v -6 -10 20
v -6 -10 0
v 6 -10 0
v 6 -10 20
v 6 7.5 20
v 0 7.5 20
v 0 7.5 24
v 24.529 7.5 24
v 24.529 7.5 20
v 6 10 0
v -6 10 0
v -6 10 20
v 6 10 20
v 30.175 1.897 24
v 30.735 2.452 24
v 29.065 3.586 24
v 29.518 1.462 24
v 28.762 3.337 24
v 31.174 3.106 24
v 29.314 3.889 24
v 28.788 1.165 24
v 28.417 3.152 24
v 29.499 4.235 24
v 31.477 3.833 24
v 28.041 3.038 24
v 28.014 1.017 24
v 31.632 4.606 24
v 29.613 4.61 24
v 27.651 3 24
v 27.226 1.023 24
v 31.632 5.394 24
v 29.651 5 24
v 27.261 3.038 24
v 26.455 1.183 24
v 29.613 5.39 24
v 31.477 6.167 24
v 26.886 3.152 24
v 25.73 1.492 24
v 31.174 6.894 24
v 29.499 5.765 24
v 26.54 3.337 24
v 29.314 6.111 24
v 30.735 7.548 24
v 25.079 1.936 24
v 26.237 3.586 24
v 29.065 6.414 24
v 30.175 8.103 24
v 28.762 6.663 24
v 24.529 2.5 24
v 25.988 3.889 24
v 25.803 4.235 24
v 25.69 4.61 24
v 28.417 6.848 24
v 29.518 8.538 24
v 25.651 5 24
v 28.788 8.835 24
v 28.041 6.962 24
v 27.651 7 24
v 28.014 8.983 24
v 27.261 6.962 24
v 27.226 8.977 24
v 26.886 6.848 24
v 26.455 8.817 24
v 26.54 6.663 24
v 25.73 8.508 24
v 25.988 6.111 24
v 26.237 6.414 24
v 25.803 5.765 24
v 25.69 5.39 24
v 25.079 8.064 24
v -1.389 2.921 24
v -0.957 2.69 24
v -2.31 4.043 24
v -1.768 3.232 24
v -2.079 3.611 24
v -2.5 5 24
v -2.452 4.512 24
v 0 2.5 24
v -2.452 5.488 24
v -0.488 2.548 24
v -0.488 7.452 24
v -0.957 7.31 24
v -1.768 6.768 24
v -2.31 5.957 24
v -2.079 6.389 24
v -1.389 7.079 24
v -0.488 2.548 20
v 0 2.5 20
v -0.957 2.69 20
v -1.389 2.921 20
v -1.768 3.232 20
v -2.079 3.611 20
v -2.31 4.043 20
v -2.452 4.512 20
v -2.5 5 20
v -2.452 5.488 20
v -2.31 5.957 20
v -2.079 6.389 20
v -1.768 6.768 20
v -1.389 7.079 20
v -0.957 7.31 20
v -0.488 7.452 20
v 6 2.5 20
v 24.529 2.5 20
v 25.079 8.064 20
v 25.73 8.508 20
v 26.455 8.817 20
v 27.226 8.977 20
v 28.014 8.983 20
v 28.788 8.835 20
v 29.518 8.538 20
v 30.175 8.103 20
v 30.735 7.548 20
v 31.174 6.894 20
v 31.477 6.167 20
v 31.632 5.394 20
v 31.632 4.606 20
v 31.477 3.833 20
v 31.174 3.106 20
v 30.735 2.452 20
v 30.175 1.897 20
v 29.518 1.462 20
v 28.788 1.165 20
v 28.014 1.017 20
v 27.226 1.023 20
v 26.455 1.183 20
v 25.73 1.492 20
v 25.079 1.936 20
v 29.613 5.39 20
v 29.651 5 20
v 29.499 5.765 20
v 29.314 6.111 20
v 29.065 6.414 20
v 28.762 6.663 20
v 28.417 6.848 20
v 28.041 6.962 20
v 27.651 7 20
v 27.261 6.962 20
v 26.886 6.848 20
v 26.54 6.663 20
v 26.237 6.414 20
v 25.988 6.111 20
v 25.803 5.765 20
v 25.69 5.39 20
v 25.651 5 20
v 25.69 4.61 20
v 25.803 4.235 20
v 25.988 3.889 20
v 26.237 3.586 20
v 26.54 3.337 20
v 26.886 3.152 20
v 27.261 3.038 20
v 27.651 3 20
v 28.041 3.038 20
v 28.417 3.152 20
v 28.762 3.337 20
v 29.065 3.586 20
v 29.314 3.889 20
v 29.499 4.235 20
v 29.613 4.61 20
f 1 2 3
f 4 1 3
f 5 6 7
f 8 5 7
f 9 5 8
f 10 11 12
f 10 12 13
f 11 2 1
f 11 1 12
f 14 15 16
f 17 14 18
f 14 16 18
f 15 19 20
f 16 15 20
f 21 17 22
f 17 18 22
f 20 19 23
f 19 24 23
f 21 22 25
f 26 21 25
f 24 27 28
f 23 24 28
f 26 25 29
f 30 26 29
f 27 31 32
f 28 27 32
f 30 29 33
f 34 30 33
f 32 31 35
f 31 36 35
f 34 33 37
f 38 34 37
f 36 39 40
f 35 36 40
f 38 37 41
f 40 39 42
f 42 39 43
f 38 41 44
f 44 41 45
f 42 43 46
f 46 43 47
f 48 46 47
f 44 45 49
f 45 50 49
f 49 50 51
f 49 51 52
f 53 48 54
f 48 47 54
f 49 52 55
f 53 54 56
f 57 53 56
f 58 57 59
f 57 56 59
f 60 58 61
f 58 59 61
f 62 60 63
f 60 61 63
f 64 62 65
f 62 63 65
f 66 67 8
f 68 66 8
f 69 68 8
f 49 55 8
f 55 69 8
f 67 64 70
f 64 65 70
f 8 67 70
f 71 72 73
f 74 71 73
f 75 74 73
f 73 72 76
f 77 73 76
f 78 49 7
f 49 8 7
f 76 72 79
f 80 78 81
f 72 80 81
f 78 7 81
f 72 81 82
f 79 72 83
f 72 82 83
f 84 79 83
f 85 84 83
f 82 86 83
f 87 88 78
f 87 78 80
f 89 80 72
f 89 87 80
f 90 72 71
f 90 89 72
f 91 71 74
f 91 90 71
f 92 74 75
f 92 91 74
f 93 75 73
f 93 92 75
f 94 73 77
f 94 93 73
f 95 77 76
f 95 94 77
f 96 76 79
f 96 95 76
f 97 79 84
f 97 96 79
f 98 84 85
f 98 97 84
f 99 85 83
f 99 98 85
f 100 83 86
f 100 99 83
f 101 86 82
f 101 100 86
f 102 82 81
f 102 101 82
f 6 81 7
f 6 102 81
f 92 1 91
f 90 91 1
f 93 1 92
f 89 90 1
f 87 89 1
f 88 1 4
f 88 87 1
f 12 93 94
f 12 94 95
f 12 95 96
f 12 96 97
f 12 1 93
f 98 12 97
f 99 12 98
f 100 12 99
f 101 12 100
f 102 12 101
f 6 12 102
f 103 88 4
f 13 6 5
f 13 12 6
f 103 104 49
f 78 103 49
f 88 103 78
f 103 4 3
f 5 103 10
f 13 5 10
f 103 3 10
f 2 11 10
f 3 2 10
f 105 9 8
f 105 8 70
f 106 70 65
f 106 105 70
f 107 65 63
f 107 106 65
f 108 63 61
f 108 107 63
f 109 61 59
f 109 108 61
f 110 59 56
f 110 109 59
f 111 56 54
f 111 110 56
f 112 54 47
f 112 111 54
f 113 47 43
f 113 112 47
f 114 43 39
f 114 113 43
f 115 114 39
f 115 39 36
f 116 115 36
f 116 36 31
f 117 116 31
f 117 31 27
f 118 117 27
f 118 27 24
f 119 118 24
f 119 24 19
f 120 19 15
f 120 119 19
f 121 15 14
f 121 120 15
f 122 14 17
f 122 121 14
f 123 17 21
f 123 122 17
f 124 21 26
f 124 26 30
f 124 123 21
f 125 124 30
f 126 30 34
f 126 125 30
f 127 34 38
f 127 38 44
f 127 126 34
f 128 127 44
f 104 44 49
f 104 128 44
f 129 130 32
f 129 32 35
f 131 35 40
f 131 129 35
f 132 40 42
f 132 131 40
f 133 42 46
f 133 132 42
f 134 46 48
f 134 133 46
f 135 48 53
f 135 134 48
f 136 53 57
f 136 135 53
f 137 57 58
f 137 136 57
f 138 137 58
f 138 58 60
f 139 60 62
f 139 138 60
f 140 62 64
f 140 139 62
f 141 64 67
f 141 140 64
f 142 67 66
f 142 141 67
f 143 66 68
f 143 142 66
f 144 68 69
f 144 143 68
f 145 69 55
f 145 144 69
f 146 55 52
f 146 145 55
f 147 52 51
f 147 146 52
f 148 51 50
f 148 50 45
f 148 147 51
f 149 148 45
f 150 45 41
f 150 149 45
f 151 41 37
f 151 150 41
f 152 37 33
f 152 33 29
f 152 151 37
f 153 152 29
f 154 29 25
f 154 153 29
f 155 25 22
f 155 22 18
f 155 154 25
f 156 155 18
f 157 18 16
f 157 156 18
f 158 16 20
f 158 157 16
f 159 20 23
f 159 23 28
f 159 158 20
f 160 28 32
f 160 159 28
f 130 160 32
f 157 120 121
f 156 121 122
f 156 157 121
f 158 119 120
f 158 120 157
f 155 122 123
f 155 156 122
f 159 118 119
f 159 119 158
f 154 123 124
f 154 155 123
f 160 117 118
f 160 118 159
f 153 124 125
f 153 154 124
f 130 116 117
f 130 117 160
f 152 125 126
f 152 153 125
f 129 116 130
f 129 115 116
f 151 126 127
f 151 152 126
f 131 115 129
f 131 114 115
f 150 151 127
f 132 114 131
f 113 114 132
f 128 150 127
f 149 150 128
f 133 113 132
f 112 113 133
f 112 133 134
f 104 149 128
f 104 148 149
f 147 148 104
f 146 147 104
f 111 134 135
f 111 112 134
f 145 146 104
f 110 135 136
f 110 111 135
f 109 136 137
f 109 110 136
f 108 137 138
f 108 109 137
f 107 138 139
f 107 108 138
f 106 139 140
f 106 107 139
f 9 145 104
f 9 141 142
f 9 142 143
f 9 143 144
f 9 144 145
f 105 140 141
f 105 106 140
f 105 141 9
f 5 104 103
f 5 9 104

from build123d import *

# Parameters (mm, degrees)
ESQUISSE1_W        = 12
ESQUISSE1_H        = 20
BOSS_EXTRU_1_DEPTH = 20
ESQUISSE2_R        = 2
BOSS_EXTRU_2_DEPTH = 4


with BuildPart() as part:
    # Esquisse1 → Boss.-Extru.1 (new body)
    with BuildSketch(Plane.XY):
        Rectangle(ESQUISSE1_W, ESQUISSE1_H)
    extrude(amount=BOSS_EXTRU_1_DEPTH)

    # Esquisse2 → Boss.-Extru.2 (add)
    with BuildSketch(Plane.XY.offset(20)):
        with BuildLine():
            Line((0, 7.5), (24.528746791, 7.5))
            ThreePointArc((24.528746791, 7.5), (31.65124579, 5), (24.528746791, 2.5))
            Line((24.528746791, 2.5), (0, 2.5))
            ThreePointArc((0, 2.5), (-2.5, 5), (0, 7.5))
        make_face()
        with Locations((27.65124579, 5)):
            Circle(ESQUISSE2_R, mode=Mode.SUBTRACT)
    extrude(amount=BOSS_EXTRU_2_DEPTH)


solid = part.part
